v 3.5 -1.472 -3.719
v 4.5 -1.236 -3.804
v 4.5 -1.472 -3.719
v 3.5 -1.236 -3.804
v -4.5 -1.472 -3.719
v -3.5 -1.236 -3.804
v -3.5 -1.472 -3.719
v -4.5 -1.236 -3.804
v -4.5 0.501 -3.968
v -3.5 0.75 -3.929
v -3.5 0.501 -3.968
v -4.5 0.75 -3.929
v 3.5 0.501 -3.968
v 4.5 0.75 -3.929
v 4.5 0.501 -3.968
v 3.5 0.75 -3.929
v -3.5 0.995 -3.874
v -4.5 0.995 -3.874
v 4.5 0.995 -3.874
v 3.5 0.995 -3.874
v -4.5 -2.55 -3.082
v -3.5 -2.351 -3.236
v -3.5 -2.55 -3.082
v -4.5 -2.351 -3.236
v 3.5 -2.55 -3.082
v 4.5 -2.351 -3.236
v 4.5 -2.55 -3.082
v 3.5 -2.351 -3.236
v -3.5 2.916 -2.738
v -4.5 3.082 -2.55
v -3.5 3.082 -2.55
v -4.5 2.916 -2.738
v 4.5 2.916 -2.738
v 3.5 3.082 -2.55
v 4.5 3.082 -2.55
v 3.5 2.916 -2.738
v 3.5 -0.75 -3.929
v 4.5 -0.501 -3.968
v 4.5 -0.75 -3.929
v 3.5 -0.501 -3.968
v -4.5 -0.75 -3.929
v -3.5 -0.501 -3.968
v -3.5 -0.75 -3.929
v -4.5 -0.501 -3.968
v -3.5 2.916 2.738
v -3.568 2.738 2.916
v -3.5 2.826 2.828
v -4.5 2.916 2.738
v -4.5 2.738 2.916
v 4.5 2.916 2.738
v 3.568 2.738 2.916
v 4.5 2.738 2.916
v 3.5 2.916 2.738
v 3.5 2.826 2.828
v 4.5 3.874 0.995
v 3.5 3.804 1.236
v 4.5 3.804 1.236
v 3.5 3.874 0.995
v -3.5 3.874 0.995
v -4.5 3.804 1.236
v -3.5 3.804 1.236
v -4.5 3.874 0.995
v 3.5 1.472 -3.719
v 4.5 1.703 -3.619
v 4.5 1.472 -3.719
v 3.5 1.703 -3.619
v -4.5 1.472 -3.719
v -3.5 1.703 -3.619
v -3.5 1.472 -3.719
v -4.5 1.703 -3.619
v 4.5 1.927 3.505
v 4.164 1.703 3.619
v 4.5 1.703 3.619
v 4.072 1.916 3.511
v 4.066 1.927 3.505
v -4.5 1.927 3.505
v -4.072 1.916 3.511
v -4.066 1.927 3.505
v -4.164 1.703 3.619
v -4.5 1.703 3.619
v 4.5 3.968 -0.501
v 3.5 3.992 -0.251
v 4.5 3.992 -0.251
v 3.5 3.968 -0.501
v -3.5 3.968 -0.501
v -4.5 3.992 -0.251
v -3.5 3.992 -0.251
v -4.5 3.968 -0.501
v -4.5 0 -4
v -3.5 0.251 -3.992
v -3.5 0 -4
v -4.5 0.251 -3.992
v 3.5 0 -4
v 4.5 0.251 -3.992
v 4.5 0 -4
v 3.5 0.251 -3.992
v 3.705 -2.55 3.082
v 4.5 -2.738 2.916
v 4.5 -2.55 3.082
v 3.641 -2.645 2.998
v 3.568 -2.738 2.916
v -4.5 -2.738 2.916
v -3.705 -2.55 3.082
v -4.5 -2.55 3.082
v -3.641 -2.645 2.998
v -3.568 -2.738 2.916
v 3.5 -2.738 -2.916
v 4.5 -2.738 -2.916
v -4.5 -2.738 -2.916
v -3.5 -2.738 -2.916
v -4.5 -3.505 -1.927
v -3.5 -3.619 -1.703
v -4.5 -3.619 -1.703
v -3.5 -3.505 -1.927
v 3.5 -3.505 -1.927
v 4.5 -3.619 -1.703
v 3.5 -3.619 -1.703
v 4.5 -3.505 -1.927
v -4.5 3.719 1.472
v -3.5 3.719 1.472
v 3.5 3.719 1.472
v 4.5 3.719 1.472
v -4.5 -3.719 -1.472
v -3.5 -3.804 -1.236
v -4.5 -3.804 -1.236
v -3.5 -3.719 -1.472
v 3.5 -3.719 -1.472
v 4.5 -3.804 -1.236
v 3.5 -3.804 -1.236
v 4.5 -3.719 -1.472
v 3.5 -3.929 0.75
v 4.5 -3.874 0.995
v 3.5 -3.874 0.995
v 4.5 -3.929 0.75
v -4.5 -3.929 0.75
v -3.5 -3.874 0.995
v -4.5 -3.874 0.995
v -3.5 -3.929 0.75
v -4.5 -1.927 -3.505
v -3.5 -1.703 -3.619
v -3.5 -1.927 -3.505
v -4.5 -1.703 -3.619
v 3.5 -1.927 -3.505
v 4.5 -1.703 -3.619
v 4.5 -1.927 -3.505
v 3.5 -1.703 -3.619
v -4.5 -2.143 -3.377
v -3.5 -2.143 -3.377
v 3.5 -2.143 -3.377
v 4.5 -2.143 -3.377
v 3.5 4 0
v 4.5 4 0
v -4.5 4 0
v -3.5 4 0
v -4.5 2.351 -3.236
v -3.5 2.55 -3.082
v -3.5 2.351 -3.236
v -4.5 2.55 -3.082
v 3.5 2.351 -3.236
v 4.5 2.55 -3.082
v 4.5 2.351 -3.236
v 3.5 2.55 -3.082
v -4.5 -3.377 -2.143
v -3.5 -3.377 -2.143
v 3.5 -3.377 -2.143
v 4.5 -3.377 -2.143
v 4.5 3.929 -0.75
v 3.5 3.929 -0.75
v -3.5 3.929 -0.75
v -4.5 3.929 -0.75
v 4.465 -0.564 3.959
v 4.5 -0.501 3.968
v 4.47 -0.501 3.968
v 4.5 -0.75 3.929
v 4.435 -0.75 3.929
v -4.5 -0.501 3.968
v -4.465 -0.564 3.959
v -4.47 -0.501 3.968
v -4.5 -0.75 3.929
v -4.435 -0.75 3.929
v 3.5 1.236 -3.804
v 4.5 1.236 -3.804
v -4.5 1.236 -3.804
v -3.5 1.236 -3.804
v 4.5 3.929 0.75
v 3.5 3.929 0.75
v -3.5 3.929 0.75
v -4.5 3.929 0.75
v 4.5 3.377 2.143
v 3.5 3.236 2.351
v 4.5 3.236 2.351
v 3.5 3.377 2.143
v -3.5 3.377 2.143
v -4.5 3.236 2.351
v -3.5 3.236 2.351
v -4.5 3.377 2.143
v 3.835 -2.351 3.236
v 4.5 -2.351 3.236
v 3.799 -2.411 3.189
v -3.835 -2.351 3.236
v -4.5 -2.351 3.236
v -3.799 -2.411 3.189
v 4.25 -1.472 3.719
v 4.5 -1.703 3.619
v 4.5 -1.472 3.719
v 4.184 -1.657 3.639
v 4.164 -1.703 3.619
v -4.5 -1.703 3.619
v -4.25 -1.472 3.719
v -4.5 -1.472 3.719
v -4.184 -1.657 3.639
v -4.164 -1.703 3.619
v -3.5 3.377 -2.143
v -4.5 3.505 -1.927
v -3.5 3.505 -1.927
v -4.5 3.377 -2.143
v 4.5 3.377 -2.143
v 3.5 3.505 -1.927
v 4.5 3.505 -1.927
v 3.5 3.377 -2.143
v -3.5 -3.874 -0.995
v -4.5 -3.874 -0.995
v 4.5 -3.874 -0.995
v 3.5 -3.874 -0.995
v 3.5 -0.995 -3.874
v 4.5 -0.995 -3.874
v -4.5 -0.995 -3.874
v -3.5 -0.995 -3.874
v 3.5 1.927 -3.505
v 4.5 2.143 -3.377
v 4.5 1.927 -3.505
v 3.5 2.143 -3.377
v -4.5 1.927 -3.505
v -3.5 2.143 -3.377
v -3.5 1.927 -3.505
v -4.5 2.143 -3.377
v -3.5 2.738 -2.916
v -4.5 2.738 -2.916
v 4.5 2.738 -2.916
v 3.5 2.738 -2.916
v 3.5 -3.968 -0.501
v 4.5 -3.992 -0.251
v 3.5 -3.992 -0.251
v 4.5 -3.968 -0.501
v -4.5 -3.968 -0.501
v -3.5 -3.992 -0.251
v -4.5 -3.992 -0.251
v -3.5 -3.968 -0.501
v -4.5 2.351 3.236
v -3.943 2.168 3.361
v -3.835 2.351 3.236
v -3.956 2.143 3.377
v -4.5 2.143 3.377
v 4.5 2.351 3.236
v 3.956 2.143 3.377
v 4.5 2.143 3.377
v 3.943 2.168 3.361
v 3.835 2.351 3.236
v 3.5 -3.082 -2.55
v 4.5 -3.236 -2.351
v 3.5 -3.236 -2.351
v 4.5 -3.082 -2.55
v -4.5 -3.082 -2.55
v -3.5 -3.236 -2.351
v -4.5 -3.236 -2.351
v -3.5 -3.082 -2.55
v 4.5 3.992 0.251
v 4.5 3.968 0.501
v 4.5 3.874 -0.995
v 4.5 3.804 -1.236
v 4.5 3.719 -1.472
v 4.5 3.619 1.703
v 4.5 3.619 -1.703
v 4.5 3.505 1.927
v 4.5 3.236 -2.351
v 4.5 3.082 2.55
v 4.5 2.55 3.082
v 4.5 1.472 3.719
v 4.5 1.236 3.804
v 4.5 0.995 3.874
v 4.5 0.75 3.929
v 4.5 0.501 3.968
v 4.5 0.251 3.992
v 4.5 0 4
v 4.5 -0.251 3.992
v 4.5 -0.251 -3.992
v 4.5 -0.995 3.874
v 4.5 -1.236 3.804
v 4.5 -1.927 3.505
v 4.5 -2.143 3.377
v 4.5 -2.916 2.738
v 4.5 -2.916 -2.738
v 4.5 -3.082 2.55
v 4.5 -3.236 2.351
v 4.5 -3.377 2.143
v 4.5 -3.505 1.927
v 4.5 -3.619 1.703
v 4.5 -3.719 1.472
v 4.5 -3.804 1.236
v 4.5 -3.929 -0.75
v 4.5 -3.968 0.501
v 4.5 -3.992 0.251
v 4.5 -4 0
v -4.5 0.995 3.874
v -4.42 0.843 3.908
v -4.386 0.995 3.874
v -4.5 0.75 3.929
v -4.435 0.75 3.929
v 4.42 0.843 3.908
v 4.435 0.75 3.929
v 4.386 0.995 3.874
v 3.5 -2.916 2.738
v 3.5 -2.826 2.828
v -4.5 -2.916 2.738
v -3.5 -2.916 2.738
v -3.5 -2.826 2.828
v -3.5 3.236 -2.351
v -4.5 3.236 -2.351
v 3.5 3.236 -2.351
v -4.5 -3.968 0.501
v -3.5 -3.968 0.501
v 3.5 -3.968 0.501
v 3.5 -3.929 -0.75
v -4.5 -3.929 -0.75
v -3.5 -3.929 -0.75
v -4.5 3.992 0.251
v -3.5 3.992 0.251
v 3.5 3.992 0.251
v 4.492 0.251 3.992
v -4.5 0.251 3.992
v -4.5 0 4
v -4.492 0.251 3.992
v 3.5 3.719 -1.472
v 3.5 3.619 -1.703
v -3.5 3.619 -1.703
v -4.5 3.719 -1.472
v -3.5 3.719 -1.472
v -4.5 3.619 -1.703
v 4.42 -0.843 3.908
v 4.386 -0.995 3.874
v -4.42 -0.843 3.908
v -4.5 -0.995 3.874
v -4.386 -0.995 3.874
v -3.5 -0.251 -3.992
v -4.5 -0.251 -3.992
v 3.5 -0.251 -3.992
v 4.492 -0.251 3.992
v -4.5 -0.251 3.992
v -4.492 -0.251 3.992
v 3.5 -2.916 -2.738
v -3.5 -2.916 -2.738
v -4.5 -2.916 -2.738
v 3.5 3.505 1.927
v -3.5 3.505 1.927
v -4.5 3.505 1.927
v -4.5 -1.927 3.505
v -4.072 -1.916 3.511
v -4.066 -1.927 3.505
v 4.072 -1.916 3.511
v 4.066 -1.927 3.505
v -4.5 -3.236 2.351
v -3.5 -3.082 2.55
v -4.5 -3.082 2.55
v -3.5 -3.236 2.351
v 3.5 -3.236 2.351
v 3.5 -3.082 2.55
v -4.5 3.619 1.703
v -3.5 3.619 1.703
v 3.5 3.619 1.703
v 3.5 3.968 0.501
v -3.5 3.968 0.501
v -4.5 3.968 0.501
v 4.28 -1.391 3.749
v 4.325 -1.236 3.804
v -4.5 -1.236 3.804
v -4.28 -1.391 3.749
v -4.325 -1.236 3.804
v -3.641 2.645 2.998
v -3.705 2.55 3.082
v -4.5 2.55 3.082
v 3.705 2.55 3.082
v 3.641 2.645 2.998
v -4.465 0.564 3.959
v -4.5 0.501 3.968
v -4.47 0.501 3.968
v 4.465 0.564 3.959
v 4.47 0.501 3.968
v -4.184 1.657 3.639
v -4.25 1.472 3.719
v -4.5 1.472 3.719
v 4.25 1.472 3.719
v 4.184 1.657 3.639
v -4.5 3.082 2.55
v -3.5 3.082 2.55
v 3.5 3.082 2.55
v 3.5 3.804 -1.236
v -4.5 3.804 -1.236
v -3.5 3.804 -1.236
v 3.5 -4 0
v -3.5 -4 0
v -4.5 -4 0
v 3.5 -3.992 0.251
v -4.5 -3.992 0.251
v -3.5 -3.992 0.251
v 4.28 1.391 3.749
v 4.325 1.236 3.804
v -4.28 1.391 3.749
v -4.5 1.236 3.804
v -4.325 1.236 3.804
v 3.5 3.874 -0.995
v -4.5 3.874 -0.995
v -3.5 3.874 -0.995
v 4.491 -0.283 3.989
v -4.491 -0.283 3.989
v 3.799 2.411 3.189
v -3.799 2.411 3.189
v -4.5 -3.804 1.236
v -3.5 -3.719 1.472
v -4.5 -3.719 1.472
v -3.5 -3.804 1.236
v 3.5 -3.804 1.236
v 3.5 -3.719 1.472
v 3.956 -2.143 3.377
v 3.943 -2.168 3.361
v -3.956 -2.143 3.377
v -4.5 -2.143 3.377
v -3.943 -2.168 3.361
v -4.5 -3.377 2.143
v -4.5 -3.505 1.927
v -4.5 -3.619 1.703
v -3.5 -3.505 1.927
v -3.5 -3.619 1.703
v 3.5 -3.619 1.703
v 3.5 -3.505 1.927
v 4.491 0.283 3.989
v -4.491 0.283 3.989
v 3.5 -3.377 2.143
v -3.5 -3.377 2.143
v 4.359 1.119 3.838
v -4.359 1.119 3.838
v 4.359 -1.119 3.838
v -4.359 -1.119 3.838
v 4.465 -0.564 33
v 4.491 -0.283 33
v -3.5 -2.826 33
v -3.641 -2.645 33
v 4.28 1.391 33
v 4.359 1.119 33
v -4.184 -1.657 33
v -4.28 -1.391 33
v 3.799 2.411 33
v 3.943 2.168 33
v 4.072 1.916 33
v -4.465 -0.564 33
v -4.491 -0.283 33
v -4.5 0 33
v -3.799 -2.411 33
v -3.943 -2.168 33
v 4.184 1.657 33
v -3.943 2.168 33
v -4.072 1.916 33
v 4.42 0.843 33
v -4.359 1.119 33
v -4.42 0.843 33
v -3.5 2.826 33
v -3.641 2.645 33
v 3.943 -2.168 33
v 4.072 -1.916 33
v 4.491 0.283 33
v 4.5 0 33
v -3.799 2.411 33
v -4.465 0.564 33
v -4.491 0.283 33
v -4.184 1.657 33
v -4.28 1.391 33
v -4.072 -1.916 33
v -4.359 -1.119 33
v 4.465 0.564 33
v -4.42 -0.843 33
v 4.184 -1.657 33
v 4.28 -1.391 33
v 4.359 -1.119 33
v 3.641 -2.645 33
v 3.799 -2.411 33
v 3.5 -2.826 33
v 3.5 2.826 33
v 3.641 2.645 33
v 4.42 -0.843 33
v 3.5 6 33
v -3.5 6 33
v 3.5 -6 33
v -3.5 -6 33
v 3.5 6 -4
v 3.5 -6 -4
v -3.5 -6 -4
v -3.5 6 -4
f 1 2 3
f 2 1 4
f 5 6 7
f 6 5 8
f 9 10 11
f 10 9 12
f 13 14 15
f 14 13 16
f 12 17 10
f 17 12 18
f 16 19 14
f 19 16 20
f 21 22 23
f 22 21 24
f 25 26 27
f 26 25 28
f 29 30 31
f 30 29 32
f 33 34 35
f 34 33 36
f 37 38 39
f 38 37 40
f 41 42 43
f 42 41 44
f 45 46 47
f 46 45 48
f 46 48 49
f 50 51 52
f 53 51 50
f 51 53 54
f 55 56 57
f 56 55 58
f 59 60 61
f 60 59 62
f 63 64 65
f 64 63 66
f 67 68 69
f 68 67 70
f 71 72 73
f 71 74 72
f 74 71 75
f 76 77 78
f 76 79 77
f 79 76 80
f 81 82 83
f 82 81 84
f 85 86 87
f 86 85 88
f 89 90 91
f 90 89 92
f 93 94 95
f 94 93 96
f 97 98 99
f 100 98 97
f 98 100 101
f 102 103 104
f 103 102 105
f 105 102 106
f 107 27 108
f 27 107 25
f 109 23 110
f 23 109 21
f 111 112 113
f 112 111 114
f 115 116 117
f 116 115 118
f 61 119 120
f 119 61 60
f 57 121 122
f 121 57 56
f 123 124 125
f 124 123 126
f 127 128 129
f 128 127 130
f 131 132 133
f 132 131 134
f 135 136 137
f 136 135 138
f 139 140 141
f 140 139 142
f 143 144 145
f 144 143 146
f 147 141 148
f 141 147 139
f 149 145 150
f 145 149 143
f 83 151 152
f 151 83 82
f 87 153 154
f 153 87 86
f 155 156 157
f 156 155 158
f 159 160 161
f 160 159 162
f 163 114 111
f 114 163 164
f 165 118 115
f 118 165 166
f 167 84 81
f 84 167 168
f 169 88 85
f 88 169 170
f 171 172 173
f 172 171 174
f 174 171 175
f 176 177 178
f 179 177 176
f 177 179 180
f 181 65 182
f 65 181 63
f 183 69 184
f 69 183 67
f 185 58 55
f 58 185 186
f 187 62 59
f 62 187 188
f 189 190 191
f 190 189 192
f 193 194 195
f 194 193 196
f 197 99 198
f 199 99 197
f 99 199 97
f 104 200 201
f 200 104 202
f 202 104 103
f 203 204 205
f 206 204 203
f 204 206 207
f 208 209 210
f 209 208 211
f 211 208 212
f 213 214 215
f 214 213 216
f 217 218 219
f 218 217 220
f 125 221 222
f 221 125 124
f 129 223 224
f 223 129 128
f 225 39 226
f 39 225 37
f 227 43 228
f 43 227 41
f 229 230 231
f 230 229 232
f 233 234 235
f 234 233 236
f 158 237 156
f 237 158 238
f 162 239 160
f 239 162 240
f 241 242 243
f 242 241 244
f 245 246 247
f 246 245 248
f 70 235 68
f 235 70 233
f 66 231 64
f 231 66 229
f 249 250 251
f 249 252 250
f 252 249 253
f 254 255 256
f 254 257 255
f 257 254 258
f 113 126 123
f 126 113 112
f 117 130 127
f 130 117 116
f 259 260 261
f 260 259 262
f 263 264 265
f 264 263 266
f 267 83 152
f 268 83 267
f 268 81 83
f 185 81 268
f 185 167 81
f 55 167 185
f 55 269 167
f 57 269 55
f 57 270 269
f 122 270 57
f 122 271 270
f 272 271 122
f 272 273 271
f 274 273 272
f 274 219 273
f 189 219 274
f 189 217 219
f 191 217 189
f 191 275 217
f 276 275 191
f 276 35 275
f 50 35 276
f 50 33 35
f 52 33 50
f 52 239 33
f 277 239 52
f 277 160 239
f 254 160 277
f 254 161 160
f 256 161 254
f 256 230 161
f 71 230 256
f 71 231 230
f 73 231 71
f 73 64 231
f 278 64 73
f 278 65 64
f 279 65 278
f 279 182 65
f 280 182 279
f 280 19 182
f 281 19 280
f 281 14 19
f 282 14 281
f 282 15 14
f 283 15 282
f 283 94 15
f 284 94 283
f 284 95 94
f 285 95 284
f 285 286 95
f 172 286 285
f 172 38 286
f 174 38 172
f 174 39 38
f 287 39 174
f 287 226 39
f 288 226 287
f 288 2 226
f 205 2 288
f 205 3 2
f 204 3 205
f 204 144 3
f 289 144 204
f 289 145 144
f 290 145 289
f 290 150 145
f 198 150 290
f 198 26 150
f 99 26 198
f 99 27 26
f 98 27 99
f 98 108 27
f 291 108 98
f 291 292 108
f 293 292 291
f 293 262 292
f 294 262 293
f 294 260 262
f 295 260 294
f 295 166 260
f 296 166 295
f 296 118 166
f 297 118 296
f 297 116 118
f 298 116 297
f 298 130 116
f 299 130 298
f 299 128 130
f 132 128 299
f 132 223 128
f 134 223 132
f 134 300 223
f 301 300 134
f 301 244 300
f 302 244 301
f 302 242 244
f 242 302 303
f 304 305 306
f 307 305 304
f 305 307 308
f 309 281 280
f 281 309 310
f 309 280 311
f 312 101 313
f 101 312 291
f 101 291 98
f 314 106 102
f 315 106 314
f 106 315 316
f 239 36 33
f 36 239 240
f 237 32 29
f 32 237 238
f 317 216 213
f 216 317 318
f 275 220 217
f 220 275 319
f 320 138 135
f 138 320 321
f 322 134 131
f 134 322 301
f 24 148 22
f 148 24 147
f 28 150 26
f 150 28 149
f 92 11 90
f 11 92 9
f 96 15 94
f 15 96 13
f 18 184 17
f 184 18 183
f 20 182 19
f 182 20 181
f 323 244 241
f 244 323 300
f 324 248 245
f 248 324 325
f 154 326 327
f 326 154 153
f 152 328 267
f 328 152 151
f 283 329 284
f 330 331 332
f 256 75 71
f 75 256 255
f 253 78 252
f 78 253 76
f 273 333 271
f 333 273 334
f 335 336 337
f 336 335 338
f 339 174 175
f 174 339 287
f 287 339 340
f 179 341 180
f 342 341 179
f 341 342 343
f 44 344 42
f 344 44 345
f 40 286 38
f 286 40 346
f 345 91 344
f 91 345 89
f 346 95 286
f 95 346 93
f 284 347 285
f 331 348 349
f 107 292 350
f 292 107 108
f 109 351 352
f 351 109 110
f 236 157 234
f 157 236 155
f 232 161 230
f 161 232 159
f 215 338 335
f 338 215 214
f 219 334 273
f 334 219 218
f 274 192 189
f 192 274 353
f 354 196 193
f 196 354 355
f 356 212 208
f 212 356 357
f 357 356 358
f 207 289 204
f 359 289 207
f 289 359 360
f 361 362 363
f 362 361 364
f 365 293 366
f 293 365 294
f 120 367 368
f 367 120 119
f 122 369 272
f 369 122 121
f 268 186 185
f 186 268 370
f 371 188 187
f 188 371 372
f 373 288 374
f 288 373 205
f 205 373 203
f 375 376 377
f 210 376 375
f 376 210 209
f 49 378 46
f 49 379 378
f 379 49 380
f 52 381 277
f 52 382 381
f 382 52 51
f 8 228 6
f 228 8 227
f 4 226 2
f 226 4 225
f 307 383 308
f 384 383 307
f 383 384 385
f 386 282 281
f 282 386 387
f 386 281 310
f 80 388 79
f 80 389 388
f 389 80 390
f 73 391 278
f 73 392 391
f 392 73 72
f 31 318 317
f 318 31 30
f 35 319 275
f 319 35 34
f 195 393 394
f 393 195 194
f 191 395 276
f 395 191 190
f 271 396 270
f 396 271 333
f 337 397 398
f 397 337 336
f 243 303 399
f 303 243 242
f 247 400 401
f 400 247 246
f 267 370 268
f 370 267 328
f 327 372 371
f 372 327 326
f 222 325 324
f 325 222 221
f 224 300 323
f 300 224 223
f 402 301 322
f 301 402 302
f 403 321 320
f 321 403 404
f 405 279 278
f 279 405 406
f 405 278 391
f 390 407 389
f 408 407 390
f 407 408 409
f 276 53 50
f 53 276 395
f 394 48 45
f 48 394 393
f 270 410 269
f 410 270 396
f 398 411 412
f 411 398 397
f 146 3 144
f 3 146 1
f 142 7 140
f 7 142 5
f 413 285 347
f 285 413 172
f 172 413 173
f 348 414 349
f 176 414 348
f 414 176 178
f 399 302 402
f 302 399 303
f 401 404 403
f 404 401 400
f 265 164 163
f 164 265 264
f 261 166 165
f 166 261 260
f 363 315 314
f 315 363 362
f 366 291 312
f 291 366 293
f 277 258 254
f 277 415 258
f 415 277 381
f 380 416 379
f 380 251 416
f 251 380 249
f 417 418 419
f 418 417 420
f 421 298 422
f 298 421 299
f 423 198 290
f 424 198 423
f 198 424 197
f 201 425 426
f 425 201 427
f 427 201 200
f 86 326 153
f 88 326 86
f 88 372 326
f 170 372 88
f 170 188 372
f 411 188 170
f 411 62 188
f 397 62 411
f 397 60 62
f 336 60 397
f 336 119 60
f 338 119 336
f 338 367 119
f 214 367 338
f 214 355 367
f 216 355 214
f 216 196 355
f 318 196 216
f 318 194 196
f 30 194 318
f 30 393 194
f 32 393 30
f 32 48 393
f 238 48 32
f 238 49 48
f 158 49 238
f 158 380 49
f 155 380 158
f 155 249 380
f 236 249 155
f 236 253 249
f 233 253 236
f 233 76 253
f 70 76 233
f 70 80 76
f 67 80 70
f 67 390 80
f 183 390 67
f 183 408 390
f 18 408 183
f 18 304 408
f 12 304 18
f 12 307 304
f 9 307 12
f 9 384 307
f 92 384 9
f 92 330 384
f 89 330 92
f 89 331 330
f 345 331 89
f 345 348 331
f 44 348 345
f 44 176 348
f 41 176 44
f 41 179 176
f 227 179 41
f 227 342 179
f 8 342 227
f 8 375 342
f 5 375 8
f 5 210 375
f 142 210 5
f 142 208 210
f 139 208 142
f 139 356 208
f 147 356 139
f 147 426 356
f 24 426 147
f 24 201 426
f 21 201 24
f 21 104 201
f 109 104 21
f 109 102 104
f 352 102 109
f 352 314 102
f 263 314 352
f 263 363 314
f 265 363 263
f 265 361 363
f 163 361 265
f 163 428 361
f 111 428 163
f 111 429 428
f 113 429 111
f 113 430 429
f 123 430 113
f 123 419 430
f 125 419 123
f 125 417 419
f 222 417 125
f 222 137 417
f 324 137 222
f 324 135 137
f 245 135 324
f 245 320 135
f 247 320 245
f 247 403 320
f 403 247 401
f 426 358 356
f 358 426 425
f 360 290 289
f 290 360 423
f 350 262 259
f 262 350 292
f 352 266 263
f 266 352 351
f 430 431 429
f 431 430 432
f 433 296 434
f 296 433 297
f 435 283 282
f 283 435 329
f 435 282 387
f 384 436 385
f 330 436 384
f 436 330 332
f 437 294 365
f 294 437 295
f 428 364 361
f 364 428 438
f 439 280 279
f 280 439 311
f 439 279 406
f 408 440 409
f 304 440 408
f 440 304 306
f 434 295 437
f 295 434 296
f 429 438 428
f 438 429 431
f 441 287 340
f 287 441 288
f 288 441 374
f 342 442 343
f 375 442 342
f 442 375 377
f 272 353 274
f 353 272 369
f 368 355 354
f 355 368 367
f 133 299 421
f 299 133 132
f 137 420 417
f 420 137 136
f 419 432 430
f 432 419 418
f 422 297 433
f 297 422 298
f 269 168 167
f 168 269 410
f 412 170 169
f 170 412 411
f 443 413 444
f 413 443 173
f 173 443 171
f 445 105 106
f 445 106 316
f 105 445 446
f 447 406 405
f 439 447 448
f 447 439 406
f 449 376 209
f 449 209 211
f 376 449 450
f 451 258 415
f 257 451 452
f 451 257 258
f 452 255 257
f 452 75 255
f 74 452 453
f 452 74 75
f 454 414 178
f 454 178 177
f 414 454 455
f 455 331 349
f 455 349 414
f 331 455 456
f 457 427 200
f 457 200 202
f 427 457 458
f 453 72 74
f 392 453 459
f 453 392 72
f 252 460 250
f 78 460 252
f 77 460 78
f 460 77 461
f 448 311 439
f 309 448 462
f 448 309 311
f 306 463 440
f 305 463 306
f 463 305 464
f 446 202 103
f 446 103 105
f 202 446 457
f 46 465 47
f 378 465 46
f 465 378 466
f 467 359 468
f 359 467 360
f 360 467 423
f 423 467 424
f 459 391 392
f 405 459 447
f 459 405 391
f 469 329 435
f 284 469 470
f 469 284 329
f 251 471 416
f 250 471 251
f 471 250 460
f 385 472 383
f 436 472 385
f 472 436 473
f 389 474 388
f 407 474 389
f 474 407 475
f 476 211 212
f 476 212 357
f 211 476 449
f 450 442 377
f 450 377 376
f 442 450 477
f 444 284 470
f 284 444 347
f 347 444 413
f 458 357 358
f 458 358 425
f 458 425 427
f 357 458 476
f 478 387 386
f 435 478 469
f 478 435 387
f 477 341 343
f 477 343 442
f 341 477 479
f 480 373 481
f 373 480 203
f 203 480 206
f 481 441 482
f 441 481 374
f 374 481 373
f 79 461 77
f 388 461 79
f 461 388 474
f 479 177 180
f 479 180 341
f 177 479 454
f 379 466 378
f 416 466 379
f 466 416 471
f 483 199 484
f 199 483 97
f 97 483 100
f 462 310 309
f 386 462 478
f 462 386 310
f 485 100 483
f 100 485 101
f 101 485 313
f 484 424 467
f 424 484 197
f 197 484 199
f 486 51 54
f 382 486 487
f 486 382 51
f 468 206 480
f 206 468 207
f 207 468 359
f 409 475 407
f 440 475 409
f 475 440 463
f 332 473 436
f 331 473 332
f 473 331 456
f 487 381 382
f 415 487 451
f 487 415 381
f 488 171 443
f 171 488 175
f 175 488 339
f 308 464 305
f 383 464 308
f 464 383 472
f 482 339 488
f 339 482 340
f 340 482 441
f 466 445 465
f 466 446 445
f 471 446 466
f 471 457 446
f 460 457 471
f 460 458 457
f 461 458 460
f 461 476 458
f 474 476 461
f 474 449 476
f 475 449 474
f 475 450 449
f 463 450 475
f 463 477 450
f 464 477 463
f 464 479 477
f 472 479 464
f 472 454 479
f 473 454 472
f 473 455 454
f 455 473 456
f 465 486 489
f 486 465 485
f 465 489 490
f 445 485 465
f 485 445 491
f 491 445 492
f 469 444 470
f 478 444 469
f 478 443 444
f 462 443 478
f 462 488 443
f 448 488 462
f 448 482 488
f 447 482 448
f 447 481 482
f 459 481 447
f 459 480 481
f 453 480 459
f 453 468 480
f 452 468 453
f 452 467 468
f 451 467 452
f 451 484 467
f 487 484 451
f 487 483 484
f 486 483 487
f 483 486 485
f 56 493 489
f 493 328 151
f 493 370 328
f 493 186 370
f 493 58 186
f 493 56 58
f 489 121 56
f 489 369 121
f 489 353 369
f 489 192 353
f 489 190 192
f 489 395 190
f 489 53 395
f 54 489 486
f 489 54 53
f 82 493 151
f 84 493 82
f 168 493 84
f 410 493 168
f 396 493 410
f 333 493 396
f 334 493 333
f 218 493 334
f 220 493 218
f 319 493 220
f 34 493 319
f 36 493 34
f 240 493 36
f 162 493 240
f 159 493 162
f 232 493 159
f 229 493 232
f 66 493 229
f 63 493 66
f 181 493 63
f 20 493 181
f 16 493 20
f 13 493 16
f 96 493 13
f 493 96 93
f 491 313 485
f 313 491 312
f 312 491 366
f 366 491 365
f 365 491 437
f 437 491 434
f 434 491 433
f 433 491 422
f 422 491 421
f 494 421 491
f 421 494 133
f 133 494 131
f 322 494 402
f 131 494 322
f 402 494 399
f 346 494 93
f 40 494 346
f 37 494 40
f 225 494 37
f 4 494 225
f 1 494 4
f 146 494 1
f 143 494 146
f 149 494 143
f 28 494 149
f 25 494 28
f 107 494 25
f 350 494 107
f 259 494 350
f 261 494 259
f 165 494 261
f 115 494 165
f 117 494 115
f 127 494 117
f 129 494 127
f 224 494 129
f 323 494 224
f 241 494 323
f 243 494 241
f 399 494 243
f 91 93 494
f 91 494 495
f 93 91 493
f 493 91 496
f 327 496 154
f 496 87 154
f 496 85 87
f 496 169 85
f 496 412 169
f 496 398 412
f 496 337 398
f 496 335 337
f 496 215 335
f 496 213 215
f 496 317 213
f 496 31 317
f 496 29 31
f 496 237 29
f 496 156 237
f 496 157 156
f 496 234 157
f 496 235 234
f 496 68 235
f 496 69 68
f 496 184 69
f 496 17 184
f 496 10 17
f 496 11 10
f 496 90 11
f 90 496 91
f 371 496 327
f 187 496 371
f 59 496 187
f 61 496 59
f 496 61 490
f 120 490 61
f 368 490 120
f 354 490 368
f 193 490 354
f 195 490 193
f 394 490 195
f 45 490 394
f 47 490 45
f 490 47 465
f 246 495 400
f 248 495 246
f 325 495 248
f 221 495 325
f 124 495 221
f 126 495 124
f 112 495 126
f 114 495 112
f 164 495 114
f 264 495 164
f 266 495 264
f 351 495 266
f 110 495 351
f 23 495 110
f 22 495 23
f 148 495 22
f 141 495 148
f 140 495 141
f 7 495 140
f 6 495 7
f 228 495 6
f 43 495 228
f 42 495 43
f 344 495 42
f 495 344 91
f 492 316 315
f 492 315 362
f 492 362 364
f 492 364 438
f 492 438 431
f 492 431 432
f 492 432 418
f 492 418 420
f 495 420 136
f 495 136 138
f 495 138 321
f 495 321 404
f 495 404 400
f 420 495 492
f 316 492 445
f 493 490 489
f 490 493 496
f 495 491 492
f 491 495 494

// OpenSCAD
translate([0,-7,-7]){


        difference(){
            union(){

                translate([-4.5,7,7]){
                    rotate([0,90,0]){
                        cylinder(h=9, r=4.0, $fn=100, center=false);
                    }
                }  


                translate([0,7,7]){
                    rotate([0,0,90]){
                        cylinder(h=40-7, r=4.5, $fn=100, center=false);
                    }
                }  



                translate([-3.5,1,3]){
                    cube([7,12,37], center=false);
                }

            }
            union() {



            }
        }
}
